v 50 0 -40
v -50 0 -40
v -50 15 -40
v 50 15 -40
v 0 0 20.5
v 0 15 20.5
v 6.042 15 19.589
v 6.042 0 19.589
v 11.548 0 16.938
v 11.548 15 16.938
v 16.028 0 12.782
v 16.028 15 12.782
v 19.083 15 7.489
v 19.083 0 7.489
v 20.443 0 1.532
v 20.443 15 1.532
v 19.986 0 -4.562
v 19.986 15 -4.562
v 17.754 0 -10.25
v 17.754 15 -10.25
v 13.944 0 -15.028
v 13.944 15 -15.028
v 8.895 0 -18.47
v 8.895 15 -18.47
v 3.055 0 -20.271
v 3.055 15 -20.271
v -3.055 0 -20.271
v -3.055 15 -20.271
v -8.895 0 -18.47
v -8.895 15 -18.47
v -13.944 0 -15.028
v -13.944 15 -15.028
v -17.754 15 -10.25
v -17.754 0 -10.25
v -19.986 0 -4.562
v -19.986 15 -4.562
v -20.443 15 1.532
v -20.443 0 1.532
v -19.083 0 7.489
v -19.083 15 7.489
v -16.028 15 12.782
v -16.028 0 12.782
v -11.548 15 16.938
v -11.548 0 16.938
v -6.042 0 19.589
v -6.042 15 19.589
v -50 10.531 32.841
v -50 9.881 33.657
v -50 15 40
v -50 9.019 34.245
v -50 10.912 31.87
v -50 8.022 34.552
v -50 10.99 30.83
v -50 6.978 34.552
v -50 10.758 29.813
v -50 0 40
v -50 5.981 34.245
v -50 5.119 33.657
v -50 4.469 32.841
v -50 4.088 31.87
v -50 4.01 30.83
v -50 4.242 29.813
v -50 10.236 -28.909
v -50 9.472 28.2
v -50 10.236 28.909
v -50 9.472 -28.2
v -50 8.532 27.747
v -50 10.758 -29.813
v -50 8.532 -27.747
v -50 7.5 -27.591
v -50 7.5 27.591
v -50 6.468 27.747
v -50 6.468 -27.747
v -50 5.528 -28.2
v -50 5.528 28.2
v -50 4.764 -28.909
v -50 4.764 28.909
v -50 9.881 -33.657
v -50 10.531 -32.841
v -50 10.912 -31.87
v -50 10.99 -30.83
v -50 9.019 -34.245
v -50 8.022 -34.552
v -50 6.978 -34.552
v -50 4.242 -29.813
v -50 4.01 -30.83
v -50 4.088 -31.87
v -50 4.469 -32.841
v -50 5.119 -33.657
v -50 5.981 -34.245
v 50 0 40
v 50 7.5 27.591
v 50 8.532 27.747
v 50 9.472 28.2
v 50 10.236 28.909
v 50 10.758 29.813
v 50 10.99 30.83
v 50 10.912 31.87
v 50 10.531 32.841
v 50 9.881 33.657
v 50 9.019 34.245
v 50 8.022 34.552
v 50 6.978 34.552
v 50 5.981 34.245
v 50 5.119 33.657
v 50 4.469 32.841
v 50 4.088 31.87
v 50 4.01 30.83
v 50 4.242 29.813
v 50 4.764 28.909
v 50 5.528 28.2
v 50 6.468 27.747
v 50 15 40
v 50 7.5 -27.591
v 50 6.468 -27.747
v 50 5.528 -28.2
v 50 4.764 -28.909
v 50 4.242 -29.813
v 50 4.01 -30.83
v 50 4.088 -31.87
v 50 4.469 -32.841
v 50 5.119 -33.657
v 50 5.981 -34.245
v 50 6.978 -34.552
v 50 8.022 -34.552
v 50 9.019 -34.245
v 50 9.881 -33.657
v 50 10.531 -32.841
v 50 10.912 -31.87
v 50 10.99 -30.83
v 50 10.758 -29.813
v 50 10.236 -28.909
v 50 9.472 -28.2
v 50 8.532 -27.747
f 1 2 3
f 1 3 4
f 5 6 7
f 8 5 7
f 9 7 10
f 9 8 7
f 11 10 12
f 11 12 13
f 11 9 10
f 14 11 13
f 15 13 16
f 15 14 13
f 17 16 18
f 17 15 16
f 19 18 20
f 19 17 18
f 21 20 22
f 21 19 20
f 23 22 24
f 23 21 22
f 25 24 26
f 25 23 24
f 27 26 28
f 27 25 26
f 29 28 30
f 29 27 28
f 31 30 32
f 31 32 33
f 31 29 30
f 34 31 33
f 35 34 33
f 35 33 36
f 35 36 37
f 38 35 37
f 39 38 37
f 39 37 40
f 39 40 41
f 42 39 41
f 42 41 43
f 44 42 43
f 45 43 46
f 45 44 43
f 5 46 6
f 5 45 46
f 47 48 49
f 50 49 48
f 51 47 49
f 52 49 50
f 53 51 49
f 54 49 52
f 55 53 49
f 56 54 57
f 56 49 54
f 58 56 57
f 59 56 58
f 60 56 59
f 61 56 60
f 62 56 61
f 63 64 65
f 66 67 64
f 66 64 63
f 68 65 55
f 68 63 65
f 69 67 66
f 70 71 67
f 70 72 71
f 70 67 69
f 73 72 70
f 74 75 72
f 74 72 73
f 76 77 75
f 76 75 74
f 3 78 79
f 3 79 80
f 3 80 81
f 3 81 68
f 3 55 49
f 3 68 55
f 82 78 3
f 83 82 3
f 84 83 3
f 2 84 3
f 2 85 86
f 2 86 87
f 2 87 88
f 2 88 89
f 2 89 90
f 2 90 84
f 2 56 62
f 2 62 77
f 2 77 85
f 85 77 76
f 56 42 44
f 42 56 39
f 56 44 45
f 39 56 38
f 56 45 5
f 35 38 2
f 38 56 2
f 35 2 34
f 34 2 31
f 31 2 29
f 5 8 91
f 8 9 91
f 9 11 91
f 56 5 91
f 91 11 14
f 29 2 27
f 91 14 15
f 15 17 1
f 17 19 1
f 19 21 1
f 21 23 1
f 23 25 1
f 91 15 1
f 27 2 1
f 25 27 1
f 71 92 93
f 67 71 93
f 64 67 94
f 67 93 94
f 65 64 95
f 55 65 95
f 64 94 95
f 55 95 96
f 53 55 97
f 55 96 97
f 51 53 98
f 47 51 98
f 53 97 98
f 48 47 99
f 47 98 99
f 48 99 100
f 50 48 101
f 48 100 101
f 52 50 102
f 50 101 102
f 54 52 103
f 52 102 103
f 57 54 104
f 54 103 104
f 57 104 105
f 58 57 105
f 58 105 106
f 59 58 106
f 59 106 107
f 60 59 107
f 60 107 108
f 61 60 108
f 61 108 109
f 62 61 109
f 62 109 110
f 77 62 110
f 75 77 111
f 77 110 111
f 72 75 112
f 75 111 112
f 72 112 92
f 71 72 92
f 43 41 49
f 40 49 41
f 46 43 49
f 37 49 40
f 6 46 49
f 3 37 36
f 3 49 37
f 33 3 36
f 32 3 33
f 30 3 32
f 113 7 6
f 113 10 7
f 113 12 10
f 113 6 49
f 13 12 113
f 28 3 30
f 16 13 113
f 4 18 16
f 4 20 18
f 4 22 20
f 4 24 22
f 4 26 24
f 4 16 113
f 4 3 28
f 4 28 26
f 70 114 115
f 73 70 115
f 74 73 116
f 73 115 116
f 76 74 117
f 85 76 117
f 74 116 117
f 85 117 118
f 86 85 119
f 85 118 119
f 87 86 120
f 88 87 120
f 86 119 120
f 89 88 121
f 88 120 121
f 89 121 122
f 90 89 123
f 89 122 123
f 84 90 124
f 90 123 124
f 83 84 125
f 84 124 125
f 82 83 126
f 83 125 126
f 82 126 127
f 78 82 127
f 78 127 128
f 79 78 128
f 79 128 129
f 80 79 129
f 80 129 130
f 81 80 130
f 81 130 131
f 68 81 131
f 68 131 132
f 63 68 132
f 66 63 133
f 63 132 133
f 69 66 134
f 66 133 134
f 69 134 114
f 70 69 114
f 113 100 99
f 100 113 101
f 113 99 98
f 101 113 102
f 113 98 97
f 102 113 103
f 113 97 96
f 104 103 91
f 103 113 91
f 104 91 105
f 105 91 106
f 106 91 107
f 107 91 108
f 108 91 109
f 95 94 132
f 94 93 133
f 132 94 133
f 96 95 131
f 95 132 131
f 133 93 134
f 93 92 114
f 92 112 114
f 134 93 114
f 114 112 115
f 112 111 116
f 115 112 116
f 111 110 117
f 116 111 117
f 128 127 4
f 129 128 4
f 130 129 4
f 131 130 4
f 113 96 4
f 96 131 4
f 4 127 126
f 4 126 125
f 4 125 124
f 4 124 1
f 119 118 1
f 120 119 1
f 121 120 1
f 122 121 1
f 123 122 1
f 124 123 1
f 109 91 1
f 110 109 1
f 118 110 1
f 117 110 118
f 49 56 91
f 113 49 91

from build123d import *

# Parameters (mm, degrees)
SKETCH1_W           = 100
SKETCH1_H           = 80
SKETCH1_R           = 20.5
BOSS_EXTRUDE1_DEPTH = 15
SKETCH2_R           = 3.5
CUT_EXTRUDE1_DEPTH  = 100


with BuildPart() as part:
    # Sketch1 → Boss-Extrude1 (new body)
    with BuildSketch(Plane(origin=(0, 0, 0), x_dir=(1, 0, 0), z_dir=(0, 1, 0))):
        Rectangle(SKETCH1_W, SKETCH1_H)
        with Locations(Location((0, 0, 0), (0, 0, 270))):
            Circle(SKETCH1_R, mode=Mode.SUBTRACT)
    extrude(amount=BOSS_EXTRUDE1_DEPTH)

    # Sketch2 → Cut-Extrude1 (cut)
    with BuildSketch(Plane(origin=(50, 0, 0), x_dir=(0, 0, -1), z_dir=(1, 0, 0))):
        with Locations((-31.091464528, 7.5)):
            Circle(SKETCH2_R)
        with Locations(Location((31.091464528, 7.5, 0), (0, 0, 180))):
            Circle(SKETCH2_R)
    extrude(amount=-CUT_EXTRUDE1_DEPTH, mode=Mode.SUBTRACT)


solid = part.part
